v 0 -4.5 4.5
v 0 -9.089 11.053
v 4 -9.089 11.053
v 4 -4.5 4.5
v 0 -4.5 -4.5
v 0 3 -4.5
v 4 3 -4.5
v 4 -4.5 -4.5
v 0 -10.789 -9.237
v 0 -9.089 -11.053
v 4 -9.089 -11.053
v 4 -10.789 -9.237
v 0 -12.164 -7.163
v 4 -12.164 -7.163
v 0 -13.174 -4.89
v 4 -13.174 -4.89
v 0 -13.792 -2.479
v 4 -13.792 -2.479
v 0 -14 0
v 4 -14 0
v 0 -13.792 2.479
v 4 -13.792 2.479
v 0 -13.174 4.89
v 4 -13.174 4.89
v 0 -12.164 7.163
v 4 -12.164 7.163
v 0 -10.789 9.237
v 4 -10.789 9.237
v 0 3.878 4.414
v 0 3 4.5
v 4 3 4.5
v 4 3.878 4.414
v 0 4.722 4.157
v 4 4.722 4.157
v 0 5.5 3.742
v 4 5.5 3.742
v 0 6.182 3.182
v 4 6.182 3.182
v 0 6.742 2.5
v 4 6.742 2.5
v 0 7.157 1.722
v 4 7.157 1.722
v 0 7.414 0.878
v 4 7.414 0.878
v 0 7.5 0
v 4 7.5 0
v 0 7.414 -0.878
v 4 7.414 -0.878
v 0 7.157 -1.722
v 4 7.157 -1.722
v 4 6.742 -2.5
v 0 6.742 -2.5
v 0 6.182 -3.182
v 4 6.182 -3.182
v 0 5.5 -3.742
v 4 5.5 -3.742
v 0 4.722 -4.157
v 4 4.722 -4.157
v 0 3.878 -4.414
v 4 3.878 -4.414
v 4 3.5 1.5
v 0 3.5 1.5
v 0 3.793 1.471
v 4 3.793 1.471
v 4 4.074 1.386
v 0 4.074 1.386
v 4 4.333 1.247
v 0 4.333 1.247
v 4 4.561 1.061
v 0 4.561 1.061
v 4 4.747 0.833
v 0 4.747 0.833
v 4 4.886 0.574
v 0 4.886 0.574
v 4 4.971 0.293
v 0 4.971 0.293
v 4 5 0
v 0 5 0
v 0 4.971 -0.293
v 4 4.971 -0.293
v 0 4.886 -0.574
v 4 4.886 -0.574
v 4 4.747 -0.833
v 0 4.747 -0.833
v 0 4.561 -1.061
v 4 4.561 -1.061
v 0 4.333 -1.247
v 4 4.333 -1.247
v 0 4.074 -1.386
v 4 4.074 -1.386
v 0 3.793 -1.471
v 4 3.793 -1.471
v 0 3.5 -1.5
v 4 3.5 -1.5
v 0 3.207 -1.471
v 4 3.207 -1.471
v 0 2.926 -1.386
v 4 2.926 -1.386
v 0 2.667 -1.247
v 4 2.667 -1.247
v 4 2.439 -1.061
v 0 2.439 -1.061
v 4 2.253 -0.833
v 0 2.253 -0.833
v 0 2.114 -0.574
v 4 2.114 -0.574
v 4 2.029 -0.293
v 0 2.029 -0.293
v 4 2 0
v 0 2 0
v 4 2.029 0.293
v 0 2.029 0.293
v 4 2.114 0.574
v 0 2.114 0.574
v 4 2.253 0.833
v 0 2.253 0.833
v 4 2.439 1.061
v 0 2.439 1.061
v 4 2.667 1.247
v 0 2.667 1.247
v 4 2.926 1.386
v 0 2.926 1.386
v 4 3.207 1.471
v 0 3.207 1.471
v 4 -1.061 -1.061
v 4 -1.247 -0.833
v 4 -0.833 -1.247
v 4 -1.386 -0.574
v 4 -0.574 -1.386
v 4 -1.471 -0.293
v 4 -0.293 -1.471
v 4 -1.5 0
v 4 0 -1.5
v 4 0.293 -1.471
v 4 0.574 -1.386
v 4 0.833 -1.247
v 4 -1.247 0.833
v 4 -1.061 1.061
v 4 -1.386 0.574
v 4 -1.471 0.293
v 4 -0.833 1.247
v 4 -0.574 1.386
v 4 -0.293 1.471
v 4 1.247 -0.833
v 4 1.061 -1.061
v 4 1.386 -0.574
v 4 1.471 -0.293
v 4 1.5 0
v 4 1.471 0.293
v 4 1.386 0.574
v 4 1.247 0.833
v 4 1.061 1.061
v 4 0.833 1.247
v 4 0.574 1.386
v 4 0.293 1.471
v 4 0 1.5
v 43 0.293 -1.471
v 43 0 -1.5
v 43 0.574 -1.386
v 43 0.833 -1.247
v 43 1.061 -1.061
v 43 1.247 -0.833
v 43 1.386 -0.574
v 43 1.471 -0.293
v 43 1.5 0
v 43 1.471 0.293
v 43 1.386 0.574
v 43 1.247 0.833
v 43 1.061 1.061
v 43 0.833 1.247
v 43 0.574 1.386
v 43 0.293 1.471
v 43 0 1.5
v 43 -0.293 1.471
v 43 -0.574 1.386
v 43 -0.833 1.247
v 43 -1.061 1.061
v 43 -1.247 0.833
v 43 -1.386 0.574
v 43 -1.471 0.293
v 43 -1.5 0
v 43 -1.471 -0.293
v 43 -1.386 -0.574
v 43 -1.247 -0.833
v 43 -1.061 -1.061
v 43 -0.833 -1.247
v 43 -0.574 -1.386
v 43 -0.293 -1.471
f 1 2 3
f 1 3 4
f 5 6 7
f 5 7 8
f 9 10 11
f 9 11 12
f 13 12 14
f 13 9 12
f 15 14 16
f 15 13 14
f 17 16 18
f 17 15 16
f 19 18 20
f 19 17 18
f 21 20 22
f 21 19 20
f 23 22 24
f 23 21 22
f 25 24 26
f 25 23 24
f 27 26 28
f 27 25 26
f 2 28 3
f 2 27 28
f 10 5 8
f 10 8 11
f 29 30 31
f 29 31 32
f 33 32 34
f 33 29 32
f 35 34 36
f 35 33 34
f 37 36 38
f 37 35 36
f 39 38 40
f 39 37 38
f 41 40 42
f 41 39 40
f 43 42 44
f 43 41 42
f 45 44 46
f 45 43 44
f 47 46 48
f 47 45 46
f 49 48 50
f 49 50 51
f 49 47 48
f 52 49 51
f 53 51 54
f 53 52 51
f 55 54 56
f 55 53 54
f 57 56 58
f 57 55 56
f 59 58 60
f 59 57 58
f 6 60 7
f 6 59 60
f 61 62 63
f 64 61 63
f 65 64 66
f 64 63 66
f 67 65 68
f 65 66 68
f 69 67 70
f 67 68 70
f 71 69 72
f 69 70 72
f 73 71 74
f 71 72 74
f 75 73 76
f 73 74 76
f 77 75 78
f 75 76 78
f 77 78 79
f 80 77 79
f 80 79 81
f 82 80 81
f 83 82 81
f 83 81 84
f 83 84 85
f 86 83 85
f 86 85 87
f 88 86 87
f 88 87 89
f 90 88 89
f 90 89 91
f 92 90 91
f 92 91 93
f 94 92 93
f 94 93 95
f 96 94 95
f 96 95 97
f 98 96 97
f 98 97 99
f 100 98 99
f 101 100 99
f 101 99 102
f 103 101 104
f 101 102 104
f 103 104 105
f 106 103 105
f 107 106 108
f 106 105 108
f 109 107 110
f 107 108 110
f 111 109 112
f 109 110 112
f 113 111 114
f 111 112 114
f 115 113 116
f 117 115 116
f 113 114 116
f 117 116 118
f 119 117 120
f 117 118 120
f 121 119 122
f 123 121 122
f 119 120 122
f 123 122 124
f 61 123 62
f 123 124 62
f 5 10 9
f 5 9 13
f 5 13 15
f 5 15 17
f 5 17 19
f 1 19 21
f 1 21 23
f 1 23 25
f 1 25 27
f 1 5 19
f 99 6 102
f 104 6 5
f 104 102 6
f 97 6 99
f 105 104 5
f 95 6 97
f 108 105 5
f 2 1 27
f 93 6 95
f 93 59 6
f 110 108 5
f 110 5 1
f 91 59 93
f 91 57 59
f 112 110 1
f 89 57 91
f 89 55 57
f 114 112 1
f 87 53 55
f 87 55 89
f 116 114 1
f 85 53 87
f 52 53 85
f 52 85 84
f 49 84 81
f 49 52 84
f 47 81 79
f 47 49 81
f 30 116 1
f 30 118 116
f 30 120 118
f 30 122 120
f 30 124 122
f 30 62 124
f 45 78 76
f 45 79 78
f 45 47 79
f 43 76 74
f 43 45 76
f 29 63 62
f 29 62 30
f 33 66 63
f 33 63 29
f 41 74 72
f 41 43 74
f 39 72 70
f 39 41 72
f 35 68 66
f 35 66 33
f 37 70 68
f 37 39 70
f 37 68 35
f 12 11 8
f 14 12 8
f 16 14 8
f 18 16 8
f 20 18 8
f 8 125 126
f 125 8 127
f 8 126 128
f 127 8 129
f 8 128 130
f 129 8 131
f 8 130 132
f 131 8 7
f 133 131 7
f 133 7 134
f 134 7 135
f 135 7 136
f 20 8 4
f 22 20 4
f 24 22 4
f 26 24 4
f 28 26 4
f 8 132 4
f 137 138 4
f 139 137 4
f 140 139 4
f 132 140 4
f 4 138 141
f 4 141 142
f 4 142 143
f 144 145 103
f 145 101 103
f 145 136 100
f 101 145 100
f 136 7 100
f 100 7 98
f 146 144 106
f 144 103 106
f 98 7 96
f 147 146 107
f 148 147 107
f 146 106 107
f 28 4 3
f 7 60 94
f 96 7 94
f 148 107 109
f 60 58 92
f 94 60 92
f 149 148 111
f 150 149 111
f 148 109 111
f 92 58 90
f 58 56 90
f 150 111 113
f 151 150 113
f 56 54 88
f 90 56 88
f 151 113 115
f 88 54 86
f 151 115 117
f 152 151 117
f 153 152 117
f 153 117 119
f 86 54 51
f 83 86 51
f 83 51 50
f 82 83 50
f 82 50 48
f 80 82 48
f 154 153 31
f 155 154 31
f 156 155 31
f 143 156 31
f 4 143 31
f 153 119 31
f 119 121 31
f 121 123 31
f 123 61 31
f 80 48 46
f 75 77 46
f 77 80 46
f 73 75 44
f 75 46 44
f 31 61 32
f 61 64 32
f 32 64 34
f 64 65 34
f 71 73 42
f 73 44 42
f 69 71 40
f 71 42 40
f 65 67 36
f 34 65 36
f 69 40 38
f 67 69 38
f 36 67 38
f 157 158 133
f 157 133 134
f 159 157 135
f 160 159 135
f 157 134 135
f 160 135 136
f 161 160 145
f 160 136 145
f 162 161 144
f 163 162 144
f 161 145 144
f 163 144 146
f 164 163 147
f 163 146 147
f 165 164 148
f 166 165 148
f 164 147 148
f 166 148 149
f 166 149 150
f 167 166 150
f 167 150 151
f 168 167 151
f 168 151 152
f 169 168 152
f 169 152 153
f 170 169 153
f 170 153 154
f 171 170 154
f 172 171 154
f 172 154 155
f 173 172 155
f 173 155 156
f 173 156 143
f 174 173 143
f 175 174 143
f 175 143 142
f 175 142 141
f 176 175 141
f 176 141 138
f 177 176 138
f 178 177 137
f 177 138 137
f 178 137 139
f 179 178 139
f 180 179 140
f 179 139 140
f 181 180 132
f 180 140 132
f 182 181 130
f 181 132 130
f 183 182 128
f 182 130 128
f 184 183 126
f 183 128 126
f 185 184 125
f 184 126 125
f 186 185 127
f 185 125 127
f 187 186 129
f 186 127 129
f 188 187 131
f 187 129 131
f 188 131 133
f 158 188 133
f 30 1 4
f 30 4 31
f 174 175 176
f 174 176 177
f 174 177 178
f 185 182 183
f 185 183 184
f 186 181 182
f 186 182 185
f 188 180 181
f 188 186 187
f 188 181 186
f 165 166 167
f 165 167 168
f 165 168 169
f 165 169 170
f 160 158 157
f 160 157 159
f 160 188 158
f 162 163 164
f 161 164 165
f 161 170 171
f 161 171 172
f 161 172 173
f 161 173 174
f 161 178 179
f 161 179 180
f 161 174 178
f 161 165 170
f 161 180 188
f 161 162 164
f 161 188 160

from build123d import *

# Parameters (mm, degrees)
SKETCH1_R           = 1.5
BOSS_EXTRUDE1_DEPTH = 4
SKETCH1_2_R         = 1.5
BOSS_EXTRUDE2_DEPTH = 43
CUT_EXTRUDE1_REACH  = 45
SKETCH2_R           = 1.5


with BuildPart() as part:
    # Sketch1 → Boss-Extrude1 (new body)
    with BuildSketch(Plane(origin=(0, 0, 0), x_dir=(0, 0, -1), z_dir=(1, 0, 0))):
        with BuildLine():
            Line((-4.5, -4.5), (-4.5, 3))
            ThreePointArc((-4.5, 3), (0, 7.5), (4.5, 3))
            Line((4.5, 3), (4.5, -4.5))
            Line((4.5, -4.5), (11.053216354, -9.088611491))
            ThreePointArc((11.053216354, -9.088611491), (0, -14), (-11.053216354, -9.088611491))
            Line((-11.053216354, -9.088611491), (-4.5, -4.5))
        make_face()
        Circle(SKETCH1_R, mode=Mode.SUBTRACT)
    extrude(amount=BOSS_EXTRUDE1_DEPTH)

    # Sketch1<2> → Boss-Extrude2 (add)
    with BuildSketch(Plane(origin=(0, 0, 0), x_dir=(0, 0, -1), z_dir=(1, 0, 0))):
        Circle(SKETCH1_2_R)
    extrude(amount=BOSS_EXTRUDE2_DEPTH)

    # Sketch2 → Cut-Extrude1 (cut, up to next)
    with BuildSketch(Plane.ZY, mode=Mode.PRIVATE) as cut_extrude1_sk1:
        with Locations((0, 3.5)):
            Circle(SKETCH2_R)
    cut_extrude1_tool1 = extrude(cut_extrude1_sk1.sketch, amount=-CUT_EXTRUDE1_REACH, mode=Mode.PRIVATE) & part.part
    add(cut_extrude1_tool1.solids().sort_by_distance((0, 3.5, 0))[0], mode=Mode.SUBTRACT)


solid = part.part
